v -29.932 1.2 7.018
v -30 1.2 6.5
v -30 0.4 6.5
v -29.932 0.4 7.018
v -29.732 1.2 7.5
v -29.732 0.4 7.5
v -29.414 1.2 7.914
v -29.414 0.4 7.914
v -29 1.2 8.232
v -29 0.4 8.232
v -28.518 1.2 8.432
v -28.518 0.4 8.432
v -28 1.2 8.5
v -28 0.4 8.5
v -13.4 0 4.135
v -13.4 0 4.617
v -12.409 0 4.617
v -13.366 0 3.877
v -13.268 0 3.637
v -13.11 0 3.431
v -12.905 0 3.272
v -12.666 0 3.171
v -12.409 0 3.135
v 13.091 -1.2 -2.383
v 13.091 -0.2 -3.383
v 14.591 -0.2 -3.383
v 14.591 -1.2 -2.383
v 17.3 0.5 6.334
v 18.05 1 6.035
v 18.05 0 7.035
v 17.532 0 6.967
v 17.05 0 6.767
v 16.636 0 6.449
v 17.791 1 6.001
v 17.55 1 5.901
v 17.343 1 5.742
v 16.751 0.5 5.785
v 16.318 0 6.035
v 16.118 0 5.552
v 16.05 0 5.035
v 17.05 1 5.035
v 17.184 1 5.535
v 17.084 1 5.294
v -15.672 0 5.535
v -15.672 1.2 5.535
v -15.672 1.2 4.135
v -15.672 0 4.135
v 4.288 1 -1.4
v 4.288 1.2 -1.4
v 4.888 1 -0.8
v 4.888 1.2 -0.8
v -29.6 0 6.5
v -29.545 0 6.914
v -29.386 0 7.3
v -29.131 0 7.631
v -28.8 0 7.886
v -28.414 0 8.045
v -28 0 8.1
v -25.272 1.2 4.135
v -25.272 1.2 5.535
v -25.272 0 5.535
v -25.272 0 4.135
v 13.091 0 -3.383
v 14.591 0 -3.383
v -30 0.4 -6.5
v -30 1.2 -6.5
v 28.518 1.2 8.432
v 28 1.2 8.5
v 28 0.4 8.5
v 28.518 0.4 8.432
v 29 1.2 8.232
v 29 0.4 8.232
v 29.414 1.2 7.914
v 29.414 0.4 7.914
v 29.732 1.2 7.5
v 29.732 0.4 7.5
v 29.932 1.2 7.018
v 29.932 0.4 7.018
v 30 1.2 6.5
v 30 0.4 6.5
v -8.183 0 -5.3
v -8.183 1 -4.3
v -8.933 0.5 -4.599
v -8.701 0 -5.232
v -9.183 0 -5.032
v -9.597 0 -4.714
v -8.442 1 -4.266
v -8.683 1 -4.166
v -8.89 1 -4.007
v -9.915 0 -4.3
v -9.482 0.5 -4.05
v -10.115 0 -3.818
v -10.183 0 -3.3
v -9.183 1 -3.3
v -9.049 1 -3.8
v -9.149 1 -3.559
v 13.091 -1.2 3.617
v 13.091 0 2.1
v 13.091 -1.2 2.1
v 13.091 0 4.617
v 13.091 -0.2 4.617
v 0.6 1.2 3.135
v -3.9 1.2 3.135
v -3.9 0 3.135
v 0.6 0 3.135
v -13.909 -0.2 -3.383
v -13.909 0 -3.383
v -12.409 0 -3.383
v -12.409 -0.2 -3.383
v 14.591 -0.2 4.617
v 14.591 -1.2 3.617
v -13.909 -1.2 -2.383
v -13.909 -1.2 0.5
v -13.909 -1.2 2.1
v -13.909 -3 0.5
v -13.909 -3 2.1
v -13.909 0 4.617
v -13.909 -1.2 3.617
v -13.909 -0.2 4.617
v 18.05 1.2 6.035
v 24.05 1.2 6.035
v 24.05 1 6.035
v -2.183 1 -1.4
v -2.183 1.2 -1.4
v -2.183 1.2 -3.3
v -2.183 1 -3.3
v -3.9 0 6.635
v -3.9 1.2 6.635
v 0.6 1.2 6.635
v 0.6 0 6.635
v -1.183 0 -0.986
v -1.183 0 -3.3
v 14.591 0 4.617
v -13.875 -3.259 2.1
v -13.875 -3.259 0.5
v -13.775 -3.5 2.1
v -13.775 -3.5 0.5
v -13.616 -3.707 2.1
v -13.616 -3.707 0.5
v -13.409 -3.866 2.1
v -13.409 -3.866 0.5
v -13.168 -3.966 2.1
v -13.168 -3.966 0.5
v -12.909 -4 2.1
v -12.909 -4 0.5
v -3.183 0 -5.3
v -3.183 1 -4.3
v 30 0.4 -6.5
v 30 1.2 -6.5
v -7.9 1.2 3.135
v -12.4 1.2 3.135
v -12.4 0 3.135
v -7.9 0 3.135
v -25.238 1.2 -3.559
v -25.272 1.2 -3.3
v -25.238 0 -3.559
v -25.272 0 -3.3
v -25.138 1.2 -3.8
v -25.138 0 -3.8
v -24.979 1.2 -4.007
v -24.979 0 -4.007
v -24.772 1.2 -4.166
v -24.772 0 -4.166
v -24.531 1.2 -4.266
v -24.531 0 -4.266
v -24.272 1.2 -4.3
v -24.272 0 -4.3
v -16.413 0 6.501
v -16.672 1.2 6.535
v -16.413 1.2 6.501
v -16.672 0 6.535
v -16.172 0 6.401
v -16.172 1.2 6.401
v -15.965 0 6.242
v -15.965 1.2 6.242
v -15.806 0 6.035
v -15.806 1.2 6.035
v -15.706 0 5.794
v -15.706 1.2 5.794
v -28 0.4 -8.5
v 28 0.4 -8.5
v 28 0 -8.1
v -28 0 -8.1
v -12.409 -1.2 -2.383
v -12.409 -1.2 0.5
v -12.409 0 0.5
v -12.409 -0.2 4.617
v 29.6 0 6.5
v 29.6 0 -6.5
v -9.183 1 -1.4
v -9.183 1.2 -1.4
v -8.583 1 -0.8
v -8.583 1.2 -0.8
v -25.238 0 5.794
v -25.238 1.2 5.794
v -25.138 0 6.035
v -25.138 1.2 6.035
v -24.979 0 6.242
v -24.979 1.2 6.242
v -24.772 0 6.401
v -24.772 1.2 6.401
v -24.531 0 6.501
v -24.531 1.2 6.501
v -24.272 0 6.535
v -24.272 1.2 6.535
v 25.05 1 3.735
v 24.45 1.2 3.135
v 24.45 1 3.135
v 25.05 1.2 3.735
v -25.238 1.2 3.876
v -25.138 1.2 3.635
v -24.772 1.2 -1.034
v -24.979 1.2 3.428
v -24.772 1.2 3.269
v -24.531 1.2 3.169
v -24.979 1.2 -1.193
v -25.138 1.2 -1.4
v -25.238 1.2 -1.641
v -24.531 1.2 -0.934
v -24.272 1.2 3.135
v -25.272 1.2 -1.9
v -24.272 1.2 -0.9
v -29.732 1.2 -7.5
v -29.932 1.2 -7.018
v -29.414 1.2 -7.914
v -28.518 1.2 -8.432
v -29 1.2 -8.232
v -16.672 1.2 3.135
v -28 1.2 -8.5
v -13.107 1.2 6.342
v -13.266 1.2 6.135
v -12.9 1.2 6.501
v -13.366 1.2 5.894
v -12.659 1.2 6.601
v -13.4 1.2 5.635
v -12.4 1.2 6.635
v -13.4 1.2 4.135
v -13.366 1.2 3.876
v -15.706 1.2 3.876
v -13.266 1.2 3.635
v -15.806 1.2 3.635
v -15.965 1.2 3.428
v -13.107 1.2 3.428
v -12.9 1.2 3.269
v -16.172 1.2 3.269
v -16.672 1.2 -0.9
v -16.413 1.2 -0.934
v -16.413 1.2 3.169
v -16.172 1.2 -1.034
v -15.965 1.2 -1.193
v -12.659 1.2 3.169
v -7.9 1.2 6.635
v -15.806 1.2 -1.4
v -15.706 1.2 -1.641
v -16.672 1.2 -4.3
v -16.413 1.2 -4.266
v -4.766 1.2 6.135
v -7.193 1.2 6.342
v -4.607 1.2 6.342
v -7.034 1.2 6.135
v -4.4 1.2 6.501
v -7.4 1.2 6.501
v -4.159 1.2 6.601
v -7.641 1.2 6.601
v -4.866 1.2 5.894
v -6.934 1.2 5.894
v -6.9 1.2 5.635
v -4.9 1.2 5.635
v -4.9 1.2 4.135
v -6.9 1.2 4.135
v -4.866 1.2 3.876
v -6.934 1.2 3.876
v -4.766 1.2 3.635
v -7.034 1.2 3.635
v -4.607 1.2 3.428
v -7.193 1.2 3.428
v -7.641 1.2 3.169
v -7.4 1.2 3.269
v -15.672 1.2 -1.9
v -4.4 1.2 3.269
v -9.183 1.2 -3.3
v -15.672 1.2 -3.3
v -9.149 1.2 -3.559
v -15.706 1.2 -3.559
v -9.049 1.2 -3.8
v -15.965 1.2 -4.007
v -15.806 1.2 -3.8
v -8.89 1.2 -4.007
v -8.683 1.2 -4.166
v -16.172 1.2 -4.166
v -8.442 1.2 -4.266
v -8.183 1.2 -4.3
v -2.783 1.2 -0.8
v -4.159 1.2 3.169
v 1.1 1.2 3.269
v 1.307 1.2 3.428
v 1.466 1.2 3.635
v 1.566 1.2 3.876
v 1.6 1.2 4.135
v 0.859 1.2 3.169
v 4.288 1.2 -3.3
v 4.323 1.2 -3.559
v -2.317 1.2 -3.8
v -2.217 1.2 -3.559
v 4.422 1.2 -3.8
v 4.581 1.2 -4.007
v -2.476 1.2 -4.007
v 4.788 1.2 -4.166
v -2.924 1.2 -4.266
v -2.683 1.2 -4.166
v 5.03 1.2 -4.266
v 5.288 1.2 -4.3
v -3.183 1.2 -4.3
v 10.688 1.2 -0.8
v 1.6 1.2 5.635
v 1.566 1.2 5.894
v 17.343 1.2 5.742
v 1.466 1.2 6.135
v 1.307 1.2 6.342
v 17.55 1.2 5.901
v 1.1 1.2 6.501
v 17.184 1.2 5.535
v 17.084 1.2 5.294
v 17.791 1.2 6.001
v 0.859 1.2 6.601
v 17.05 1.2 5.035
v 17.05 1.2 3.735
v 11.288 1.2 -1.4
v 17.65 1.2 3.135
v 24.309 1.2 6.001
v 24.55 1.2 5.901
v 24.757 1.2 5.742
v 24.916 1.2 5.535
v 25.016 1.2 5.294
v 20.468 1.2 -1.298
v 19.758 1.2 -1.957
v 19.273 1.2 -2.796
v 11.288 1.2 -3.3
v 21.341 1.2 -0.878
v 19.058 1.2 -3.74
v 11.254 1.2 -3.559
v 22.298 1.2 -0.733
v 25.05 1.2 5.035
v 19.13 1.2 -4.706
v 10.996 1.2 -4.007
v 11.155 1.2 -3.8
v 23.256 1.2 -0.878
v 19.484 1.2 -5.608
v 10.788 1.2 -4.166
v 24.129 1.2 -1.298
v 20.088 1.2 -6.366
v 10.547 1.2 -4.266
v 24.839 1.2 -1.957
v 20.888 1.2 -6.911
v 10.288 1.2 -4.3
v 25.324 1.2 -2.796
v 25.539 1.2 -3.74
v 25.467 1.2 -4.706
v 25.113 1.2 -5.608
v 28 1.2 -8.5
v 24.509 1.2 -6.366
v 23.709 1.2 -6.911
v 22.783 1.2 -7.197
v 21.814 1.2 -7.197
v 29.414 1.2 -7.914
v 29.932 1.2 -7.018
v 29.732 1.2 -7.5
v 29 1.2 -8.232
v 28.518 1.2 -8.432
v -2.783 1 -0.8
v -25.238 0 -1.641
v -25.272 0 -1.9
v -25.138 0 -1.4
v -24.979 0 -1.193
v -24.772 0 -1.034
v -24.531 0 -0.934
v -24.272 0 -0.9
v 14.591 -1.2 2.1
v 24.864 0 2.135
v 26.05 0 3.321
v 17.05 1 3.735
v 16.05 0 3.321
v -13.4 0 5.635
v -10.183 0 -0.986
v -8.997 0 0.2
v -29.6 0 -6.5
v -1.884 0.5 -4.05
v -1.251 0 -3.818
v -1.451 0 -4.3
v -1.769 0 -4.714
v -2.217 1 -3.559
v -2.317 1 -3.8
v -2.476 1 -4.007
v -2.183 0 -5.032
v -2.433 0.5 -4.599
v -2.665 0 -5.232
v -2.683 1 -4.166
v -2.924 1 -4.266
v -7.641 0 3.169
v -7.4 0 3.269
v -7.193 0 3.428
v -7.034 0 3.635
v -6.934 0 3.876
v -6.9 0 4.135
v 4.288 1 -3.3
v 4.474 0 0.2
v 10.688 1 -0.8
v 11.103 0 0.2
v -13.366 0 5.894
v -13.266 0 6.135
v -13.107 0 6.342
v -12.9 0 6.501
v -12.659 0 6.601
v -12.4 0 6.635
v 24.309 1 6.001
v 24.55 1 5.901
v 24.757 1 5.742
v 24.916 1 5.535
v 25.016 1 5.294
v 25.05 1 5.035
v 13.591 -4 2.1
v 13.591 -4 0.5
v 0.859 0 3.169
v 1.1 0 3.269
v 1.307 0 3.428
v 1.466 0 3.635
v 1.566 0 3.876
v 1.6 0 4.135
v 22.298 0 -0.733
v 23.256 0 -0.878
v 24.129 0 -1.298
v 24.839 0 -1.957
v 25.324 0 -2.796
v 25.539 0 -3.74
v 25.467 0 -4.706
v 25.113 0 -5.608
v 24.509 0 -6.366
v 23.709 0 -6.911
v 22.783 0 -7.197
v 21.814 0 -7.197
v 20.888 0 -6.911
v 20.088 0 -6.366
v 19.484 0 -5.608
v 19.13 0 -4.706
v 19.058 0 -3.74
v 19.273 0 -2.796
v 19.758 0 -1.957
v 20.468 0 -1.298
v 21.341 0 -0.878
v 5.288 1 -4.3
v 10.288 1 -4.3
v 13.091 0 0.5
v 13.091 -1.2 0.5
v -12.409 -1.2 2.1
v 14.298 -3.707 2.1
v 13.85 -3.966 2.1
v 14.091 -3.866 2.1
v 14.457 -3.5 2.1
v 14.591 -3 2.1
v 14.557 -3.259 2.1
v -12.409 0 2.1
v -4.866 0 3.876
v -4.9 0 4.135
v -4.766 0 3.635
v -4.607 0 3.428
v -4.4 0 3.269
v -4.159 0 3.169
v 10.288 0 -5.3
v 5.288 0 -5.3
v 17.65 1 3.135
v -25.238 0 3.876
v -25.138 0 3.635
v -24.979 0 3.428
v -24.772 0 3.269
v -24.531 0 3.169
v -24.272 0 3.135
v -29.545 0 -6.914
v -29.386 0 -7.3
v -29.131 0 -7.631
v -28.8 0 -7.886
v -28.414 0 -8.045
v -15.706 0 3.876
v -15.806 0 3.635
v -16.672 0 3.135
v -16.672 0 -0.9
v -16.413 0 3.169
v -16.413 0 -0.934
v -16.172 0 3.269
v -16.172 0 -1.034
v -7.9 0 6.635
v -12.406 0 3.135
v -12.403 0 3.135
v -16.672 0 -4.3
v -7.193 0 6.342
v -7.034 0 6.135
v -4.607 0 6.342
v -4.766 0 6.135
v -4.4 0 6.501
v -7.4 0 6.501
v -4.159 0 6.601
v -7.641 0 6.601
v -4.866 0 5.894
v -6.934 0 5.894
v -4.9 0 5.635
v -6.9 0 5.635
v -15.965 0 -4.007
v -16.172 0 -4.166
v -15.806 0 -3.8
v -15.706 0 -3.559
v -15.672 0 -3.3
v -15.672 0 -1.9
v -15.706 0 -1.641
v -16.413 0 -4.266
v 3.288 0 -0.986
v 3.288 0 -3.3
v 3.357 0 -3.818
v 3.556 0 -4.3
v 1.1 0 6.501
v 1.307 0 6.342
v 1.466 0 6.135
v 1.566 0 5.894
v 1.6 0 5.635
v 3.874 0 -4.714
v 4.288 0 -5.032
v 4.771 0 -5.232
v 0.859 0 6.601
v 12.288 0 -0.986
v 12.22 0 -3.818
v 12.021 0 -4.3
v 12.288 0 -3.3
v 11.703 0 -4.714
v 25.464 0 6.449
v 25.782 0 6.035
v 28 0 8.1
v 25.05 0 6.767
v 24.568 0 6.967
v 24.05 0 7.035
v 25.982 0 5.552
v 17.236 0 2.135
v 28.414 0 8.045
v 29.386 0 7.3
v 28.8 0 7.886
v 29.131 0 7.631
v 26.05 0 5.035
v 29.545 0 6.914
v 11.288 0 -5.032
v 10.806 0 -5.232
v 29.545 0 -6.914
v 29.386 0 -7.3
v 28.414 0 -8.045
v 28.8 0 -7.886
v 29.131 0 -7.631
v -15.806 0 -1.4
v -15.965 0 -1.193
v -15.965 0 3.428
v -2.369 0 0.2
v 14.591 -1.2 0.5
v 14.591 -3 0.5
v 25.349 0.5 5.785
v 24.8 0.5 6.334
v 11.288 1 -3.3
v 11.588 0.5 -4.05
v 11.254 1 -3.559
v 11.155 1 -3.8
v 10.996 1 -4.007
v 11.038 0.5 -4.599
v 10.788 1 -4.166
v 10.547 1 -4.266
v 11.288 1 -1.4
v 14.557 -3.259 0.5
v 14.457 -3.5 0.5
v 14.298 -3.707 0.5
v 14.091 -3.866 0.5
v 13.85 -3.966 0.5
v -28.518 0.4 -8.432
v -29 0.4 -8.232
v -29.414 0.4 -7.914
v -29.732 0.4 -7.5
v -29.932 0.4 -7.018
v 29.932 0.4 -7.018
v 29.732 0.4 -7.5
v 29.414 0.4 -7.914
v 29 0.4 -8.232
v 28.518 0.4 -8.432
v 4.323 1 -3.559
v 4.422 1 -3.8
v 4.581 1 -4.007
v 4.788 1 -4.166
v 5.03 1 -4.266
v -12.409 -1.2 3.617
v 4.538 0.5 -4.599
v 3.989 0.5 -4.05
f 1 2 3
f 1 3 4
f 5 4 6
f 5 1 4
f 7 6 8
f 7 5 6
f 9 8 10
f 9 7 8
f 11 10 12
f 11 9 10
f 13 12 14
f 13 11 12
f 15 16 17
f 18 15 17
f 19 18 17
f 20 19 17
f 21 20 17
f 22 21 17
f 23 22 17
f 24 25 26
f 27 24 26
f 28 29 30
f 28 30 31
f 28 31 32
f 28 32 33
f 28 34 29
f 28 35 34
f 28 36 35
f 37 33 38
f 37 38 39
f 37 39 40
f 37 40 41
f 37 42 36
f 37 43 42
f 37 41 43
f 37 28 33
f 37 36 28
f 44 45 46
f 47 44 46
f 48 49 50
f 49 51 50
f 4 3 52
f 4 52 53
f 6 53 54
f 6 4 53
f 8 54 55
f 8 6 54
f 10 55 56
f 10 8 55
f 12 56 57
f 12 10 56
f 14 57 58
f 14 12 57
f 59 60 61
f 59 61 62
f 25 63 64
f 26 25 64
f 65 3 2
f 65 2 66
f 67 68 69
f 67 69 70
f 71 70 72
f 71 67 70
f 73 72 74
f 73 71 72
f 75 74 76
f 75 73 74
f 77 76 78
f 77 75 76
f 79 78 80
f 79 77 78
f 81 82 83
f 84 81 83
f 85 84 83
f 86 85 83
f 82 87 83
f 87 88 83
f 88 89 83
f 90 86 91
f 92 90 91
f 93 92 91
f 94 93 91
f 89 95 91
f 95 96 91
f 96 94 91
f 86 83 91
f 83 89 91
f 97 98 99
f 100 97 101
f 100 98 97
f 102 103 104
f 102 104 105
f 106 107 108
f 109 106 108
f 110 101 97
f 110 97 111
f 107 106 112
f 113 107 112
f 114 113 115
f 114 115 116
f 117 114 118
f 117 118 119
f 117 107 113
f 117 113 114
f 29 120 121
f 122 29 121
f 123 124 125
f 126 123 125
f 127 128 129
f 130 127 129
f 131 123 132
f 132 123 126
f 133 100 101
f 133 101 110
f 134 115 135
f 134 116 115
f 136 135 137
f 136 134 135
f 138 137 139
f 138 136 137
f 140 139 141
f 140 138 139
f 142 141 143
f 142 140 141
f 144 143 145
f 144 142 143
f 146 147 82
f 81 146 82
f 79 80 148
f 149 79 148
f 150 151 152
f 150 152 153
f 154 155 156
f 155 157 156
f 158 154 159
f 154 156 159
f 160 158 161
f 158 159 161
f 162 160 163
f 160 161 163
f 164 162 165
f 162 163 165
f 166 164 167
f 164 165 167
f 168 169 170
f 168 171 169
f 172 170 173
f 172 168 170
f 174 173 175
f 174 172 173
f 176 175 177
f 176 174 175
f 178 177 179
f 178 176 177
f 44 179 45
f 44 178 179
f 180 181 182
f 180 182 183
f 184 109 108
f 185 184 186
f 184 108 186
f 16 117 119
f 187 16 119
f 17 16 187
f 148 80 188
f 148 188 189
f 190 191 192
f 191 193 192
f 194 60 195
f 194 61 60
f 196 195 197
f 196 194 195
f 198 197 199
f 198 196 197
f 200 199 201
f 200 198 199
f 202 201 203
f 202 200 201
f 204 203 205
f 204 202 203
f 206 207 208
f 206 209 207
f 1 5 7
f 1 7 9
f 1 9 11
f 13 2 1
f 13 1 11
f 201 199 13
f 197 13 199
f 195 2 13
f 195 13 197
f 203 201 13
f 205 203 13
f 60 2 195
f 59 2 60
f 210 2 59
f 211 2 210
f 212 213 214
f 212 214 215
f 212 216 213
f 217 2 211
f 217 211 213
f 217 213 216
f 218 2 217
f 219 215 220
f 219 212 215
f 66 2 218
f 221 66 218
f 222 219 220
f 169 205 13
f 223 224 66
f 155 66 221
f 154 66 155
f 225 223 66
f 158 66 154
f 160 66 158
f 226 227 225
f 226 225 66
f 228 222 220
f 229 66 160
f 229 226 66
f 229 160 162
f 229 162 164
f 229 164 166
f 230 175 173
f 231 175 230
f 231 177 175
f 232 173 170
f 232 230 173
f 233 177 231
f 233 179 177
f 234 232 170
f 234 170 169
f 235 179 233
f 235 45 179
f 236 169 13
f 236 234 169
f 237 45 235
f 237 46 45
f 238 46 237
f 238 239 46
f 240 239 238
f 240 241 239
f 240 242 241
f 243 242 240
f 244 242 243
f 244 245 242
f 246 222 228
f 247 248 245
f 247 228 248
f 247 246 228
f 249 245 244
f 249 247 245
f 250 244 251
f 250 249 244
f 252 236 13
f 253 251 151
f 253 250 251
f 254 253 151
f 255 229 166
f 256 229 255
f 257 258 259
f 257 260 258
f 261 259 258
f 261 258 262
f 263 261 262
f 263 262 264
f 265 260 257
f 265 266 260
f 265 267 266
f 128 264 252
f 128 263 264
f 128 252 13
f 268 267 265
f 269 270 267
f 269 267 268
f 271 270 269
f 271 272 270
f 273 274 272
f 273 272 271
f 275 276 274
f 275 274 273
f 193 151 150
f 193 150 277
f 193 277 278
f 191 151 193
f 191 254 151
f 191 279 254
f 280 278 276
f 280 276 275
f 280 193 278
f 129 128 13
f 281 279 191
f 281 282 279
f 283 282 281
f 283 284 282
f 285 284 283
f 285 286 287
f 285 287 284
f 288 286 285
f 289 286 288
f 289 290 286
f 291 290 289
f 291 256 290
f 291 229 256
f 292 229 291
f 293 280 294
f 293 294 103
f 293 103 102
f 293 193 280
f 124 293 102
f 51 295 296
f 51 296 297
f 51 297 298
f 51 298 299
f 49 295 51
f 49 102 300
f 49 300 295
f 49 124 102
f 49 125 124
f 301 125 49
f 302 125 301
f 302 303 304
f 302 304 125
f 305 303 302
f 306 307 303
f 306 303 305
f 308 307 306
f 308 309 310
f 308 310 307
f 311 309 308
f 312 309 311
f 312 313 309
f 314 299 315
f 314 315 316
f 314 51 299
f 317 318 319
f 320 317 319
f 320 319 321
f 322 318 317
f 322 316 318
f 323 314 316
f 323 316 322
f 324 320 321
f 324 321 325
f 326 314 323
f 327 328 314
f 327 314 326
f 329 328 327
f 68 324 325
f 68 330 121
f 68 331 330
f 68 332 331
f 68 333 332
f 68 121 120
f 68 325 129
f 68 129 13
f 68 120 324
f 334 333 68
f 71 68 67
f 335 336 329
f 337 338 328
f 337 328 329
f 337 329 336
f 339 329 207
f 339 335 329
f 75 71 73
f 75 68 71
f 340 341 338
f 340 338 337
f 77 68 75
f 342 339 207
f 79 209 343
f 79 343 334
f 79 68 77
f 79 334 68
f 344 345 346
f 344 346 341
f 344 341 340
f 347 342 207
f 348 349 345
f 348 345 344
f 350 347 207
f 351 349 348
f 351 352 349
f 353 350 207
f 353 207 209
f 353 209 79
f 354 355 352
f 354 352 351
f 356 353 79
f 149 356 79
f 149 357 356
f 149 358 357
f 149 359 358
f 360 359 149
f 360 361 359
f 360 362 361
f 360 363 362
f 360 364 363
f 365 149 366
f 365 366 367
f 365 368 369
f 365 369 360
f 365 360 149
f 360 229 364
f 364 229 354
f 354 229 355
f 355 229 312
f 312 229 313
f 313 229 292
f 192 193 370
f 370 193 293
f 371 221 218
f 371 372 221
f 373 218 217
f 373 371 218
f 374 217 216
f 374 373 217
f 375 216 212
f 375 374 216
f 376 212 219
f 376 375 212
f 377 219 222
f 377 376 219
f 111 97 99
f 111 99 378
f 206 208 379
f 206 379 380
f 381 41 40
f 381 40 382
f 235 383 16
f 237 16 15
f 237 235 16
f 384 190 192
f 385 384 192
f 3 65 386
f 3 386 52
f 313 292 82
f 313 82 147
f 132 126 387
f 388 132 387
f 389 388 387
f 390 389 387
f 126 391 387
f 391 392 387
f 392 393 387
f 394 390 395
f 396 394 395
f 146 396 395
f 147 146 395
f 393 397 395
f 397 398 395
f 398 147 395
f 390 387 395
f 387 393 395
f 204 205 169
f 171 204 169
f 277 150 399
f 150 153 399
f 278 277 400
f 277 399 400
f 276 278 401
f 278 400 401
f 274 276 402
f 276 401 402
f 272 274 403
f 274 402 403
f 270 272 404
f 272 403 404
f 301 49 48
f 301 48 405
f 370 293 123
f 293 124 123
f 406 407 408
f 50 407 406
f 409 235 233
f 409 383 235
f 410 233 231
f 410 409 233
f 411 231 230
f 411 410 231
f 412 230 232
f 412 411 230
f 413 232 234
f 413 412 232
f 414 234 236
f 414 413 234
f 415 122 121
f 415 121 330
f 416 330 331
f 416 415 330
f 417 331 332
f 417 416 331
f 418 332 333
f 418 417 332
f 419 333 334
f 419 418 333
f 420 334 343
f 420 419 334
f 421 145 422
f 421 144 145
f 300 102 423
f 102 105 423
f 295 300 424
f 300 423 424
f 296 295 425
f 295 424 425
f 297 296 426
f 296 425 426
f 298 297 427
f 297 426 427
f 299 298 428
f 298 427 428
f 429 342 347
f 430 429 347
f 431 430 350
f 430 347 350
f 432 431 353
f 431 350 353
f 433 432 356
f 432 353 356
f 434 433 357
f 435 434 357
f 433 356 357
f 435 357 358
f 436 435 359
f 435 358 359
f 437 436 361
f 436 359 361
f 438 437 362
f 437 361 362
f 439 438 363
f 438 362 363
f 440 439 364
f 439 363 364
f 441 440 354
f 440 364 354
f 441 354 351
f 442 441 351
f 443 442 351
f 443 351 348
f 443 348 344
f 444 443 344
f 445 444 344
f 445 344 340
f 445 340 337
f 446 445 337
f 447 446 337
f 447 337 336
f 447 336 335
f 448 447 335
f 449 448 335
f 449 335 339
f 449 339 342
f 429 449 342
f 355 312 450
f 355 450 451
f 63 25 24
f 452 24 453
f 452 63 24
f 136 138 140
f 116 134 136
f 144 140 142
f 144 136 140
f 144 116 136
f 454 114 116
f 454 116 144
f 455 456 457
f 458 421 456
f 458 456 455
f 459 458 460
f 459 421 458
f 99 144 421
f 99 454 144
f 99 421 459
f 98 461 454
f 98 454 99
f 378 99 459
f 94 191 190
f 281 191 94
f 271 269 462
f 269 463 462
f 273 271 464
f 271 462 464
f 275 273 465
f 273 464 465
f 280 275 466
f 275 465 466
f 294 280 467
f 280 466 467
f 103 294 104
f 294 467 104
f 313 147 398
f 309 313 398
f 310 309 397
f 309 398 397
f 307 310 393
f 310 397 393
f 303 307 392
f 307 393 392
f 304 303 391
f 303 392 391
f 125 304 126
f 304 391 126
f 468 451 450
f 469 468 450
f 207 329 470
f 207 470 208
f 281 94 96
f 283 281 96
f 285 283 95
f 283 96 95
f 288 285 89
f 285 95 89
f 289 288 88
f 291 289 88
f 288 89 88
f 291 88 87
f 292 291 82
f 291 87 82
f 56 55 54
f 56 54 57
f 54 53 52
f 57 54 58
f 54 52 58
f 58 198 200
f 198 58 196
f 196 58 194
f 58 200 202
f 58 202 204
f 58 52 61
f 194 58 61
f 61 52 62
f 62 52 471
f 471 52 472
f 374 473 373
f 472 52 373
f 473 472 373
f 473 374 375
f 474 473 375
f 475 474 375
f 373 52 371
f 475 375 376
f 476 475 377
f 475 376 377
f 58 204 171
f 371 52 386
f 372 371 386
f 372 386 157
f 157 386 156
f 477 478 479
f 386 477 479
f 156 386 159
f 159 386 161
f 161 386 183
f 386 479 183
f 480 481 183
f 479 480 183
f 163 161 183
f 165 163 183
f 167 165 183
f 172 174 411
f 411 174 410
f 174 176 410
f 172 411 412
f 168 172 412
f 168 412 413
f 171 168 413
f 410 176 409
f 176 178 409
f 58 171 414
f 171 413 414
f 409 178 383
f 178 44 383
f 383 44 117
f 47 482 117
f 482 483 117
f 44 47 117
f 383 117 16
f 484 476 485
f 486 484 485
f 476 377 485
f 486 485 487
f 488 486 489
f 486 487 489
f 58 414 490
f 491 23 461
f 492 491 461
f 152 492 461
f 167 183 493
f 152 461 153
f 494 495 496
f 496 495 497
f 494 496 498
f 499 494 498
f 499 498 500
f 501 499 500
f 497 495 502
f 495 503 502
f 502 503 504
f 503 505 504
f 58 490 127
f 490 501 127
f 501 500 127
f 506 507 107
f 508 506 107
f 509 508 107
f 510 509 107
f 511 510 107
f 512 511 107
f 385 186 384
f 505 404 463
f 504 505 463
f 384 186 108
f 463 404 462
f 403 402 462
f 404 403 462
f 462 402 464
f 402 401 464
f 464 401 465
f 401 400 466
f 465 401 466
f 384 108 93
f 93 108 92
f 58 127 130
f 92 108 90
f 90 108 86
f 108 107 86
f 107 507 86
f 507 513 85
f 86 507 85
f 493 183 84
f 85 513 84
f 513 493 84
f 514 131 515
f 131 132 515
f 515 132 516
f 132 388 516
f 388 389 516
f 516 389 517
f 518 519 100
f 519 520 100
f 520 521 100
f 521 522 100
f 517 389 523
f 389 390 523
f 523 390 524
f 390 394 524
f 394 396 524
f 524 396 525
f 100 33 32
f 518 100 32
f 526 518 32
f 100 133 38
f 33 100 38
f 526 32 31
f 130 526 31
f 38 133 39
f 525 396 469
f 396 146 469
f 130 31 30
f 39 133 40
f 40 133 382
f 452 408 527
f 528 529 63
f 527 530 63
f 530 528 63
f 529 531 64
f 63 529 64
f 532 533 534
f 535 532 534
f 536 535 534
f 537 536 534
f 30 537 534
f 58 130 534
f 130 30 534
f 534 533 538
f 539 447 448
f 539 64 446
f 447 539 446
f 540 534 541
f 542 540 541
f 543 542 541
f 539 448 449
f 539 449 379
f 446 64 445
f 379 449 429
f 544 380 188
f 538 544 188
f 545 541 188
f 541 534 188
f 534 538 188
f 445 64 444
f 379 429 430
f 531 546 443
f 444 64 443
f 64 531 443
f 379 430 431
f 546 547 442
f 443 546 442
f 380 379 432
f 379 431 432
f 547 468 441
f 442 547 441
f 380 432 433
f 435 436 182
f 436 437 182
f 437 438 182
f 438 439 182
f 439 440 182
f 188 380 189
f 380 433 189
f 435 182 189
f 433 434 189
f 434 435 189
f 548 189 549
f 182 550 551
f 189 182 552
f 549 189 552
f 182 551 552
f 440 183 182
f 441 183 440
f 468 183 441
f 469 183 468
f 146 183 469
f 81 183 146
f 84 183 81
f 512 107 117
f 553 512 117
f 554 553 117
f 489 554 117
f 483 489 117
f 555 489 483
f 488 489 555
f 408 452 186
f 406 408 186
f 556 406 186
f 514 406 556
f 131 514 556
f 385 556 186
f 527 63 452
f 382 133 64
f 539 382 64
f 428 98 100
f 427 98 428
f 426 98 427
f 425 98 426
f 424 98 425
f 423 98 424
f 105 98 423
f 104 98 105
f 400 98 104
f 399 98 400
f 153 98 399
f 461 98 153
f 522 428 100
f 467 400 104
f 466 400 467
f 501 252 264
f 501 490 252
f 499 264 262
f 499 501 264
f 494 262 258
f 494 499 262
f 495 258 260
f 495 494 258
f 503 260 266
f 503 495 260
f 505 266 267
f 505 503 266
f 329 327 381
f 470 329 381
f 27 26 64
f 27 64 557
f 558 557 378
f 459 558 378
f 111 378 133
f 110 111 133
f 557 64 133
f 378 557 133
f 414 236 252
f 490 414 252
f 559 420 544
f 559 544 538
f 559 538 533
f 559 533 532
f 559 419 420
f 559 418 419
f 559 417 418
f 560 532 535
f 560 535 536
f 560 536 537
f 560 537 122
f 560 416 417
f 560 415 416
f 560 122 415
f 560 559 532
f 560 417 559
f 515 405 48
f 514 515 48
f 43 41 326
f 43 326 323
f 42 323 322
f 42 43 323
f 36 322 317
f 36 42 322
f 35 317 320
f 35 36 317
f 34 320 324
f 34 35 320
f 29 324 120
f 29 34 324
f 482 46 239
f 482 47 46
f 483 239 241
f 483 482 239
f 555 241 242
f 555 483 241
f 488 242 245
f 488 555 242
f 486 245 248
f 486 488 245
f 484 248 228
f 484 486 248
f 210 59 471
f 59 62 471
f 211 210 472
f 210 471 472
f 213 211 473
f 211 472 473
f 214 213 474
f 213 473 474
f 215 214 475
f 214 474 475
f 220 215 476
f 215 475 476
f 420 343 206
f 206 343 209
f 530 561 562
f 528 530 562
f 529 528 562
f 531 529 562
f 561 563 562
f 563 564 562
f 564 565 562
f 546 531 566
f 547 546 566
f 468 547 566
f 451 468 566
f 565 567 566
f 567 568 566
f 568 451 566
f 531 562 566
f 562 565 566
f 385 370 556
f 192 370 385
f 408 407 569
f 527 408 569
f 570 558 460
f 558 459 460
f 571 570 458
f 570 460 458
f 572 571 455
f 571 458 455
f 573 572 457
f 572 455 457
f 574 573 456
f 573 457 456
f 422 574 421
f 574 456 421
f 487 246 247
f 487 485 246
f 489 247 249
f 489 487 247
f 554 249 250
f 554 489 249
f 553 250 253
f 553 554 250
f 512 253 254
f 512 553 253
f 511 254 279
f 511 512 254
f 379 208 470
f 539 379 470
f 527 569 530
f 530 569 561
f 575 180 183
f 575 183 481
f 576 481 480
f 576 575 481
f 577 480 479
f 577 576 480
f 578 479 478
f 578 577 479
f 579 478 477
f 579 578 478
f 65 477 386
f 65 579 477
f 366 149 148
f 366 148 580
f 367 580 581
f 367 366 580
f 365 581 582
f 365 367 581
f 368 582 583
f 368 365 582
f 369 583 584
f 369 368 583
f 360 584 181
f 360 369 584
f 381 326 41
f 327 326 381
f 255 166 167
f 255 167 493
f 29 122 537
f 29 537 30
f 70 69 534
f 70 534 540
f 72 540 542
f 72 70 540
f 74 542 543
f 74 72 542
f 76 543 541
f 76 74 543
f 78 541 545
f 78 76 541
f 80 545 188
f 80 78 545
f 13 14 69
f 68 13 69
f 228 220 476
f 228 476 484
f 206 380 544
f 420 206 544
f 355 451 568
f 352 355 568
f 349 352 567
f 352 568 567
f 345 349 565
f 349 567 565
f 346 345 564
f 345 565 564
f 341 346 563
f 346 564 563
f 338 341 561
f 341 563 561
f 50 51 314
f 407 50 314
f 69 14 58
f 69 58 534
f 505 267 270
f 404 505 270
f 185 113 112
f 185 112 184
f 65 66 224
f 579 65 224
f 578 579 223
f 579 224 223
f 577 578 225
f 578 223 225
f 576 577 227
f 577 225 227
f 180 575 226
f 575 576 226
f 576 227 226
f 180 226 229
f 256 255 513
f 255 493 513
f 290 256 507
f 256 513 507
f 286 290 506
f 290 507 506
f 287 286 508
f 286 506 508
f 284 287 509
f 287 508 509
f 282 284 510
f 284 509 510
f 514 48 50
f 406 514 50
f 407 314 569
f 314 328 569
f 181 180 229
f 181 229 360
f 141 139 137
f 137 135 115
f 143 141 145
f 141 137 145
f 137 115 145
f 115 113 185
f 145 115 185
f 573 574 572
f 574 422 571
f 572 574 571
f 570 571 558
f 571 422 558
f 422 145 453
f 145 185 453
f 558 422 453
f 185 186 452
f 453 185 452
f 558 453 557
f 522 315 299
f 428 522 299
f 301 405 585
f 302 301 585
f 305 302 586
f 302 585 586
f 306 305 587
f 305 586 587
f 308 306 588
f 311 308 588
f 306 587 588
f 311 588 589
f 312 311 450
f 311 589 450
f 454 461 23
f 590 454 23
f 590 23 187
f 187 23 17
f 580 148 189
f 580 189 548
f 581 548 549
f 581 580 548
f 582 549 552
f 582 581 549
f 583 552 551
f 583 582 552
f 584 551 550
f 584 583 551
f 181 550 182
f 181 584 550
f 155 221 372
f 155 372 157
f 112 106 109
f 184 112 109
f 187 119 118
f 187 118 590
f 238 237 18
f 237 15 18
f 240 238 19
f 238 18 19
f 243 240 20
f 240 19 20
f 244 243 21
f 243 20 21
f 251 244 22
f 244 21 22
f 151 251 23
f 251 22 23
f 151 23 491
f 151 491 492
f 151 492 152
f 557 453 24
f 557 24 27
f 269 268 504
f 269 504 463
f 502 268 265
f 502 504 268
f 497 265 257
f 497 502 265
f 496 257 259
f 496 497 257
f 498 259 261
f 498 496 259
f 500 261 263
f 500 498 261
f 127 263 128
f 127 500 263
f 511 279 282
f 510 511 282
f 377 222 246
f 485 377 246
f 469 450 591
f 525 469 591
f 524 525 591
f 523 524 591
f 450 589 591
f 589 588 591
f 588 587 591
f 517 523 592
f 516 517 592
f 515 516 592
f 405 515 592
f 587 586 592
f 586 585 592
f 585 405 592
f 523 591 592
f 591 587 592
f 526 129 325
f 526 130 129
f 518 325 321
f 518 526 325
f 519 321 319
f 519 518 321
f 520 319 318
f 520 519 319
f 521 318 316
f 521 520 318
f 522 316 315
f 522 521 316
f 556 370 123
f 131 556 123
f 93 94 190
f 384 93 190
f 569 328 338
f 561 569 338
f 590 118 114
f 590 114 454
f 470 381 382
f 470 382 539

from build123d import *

# Parameters (mm, degrees)
SKETCH_1_W          = 60
SKETCH_1_H          = 17
EXTRUDE_1_DEPTH     = 1.2
CUT_EXTRUDE_1_REACH = 33.204
SKETCH_4_R          = 3.25
SKETCH_4_W          = 9.6
SKETCH_4_H          = 3.4
SKETCH_4_W_2        = 7
SKETCH_4_H_2        = 3.5
SKETCH_4_W_3        = 8
SKETCH_4_H_3        = 2.9
SKETCH_4_W_4        = 6.5
FILLET_2_R          = 1
CHAMFER_1_SIZE      = 0.6
SKETCH_5_W          = 1.5
SKETCH_5_H          = 8
EXTRUDE_2_DEPTH     = 1.2
SKETCH_6_W          = 28.5
SKETCH_6_H          = 1.6
EXTRUDE_3_DEPTH     = 4
FILLET_3_R          = 1
CHAMFER_2_SIZE      = 1
CHAMFER_4_SIZE      = 1
FILLET_4_R          = 2
CHAMFER_5_SIZE      = 0.4


with BuildPart() as part:
    # 草图1 → 凸台-拉伸1 (new body)
    with BuildSketch(Plane(origin=(0, 0, 0), x_dir=(1, 0, 0), z_dir=(0, 1, 0))):
        Rectangle(SKETCH_1_W, SKETCH_1_H)
    extrude(amount=EXTRUDE_1_DEPTH)

    # 草图4 → 切除-拉伸1 (cut, up to next)
    with BuildSketch(Plane(origin=(0, 1.2, 0), x_dir=(1, 0, 0), z_dir=(0, 1, 0)), mode=Mode.PRIVATE) as cut_extrude_1_sk1:
        with Locations(Location((22.298485985, 3.98318929, 0), (0, 0, 270))):
            Circle(SKETCH_4_R)
    cut_extrude_1_tool1 = extrude(cut_extrude_1_sk1.sketch, amount=-CUT_EXTRUDE_1_REACH, mode=Mode.PRIVATE) & part.part
    # 草图4 → 切除-拉伸1 (cut, up to next)
    with BuildSketch(Plane(origin=(0, 1.2, 0), x_dir=(1, 0, 0), z_dir=(0, 1, 0)), mode=Mode.PRIVATE) as cut_extrude_1_sk2:
        with Locations((-20.471722325, 2.6)):
            Rectangle(SKETCH_4_W, SKETCH_4_H)
    cut_extrude_1_tool2 = extrude(cut_extrude_1_sk2.sketch, amount=-CUT_EXTRUDE_1_REACH, mode=Mode.PRIVATE) & part.part
    # 草图4 → 切除-拉伸1 (cut, up to next)
    with BuildSketch(Plane(origin=(0, 1.2, 0), x_dir=(1, 0, 0), z_dir=(0, 1, 0)), mode=Mode.PRIVATE) as cut_extrude_1_sk3:
        with Locations((-5.682926277, 2.55)):
            Rectangle(SKETCH_4_W_2, SKETCH_4_H_2)
    cut_extrude_1_tool3 = extrude(cut_extrude_1_sk3.sketch, amount=-CUT_EXTRUDE_1_REACH, mode=Mode.PRIVATE) & part.part
    # 草图4 → 切除-拉伸1 (cut, up to next)
    with BuildSketch(Plane(origin=(0, 1.2, 0), x_dir=(1, 0, 0), z_dir=(0, 1, 0)), mode=Mode.PRIVATE) as cut_extrude_1_sk4:
        with Locations((7.788485985, 2.55)):
            Rectangle(SKETCH_4_W_2, SKETCH_4_H_2)
    cut_extrude_1_tool4 = extrude(cut_extrude_1_sk4.sketch, amount=-CUT_EXTRUDE_1_REACH, mode=Mode.PRIVATE) & part.part
    # 草图4 → 切除-拉伸1 (cut, up to next)
    with BuildSketch(Plane(origin=(0, 1.2, 0), x_dir=(1, 0, 0), z_dir=(0, 1, 0)), mode=Mode.PRIVATE) as cut_extrude_1_sk5:
        with Locations((21.05, -4.584803861)):
            Rectangle(SKETCH_4_W_3, SKETCH_4_H_3)
    cut_extrude_1_tool5 = extrude(cut_extrude_1_sk5.sketch, amount=-CUT_EXTRUDE_1_REACH, mode=Mode.PRIVATE) & part.part
    # 草图4 → 切除-拉伸1 (cut, up to next)
    with BuildSketch(Plane(origin=(0, 1.2, 0), x_dir=(1, 0, 0), z_dir=(0, 1, 0)), mode=Mode.PRIVATE) as cut_extrude_1_sk6:
        with Locations((-1.65, -4.884803861)):
            Rectangle(SKETCH_4_W_4, SKETCH_4_H_2)
    cut_extrude_1_tool6 = extrude(cut_extrude_1_sk6.sketch, amount=-CUT_EXTRUDE_1_REACH, mode=Mode.PRIVATE) & part.part
    # 草图4 → 切除-拉伸1 (cut, up to next)
    with BuildSketch(Plane(origin=(0, 1.2, 0), x_dir=(1, 0, 0), z_dir=(0, 1, 0)), mode=Mode.PRIVATE) as cut_extrude_1_sk7:
        with Locations((-10.15, -4.884803861)):
            Rectangle(SKETCH_4_W_4, SKETCH_4_H_2)
    cut_extrude_1_tool7 = extrude(cut_extrude_1_sk7.sketch, amount=-CUT_EXTRUDE_1_REACH, mode=Mode.PRIVATE) & part.part
    # 草图4 → 切除-拉伸1 (cut, up to next)
    with BuildSketch(Plane(origin=(0, 1.2, 0), x_dir=(1, 0, 0), z_dir=(0, 1, 0)), mode=Mode.PRIVATE) as cut_extrude_1_sk8:
        with Locations((-20.471722325, -4.834803861)):
            Rectangle(SKETCH_4_W, SKETCH_4_H)
    cut_extrude_1_tool8 = extrude(cut_extrude_1_sk8.sketch, amount=-CUT_EXTRUDE_1_REACH, mode=Mode.PRIVATE) & part.part
    add(cut_extrude_1_tool1.solids().sort_by_distance((22.298486, 1.2, -3.983189))[0], mode=Mode.SUBTRACT)
    add(cut_extrude_1_tool2.solids().sort_by_distance((-20.471722, 1.2, -2.6))[0], mode=Mode.SUBTRACT)
    add(cut_extrude_1_tool3.solids().sort_by_distance((-5.682926, 1.2, -2.55))[0], mode=Mode.SUBTRACT)
    add(cut_extrude_1_tool4.solids().sort_by_distance((7.788486, 1.2, -2.55))[0], mode=Mode.SUBTRACT)
    add(cut_extrude_1_tool5.solids().sort_by_distance((21.05, 1.2, 4.584804))[0], mode=Mode.SUBTRACT)
    add(cut_extrude_1_tool6.solids().sort_by_distance((-1.65, 1.2, 4.884804))[0], mode=Mode.SUBTRACT)
    add(cut_extrude_1_tool7.solids().sort_by_distance((-10.15, 1.2, 4.884804))[0], mode=Mode.SUBTRACT)
    add(cut_extrude_1_tool8.solids().sort_by_distance((-20.471722, 1.2, 4.834804))[0], mode=Mode.SUBTRACT)

    # 圆角2
    fillet_2_edges = [part.edges().sort_by_distance(p)[0] for p in [
        (-9.182926277, 0.6, -4.3),
        (-2.182926277, 0.6, -4.3),
        (4.288485985, 0.6, -4.3),
        (11.288485985, 0.6, -4.3),
        (17.05, 0.6, 6.034803861),
        (25.05, 0.6, 6.034803861),
        (-4.9, 0.6, 6.634803861),
        (-4.9, 0.6, 3.134803861),
        (1.6, 0.6, 3.134803861),
        (1.6, 0.6, 6.634803861),
        (-13.4, 0.6, 6.634803861),
        (-13.4, 0.6, 3.134803861),
        (-6.9, 0.6, 3.134803861),
        (-6.9, 0.6, 6.634803861),
        (-25.271722325, 0.6, 6.534803861),
        (-25.271722325, 0.6, 3.134803861),
        (-15.671722325, 0.6, 3.134803861),
        (-15.671722325, 0.6, 6.534803861),
        (-25.271722325, 0.6, -0.9),
        (-25.271722325, 0.6, -4.3),
        (-15.671722325, 0.6, -4.3),
        (-15.671722325, 0.6, -0.9),
    ]]
    fillet(fillet_2_edges, radius=FILLET_2_R)

    # 倒角1
    chamfer_1_edges = [part.edges().sort_by_distance(p)[0] for p in [
        (-9.182926277, 0.6, -0.8),
        (-2.182926277, 0.6, -0.8),
        (4.288485985, 0.6, -0.8),
        (11.288485985, 0.6, -0.8),
        (17.05, 0.6, 3.134803861),
        (25.05, 0.6, 3.134803861),
    ]]
    chamfer(chamfer_1_edges, length=CHAMFER_1_SIZE)

    # 草图5 → 凸台-拉伸2 (add)
    with BuildSketch(Plane.XZ):
        with Locations((-13.15891381, 0.61681071)):
            Rectangle(SKETCH_5_W, SKETCH_5_H)
        with Locations((13.84108619, 0.61681071)):
            Rectangle(SKETCH_5_W, SKETCH_5_H)
    extrude(amount=EXTRUDE_2_DEPTH)

    # 草图6 → 凸台-拉伸3 (add)
    with BuildSketch(Plane.XZ):
        with Locations((0.34108619, 1.3)):
            Rectangle(SKETCH_6_W, SKETCH_6_H)
    extrude(amount=EXTRUDE_3_DEPTH)

    # 圆角3
    fillet_3_edges = [part.edges().sort_by_distance(p)[0] for p in [
        (-13.90891381, -4, 1.3),
        (14.59108619, -4, 1.3),
    ]]
    fillet(fillet_3_edges, radius=FILLET_3_R)

    # 倒角2
    chamfer_2_edges = [part.edges().sort_by_distance(p)[0] for p in [
        (-13.15891381, -1.2, -3.38318929),
        (-13.15891381, -1.2, 4.61681071),
        (13.84108619, -1.2, -3.38318929),
        (13.84108619, -1.2, 4.61681071),
    ]]
    chamfer(chamfer_2_edges, length=CHAMFER_2_SIZE)

    # 倒角4
    chamfer_4_edges = [part.edges().sort_by_distance(p)[0] for p in [
        (-5.682926277, 0, -4.3),
        (-2.182926277, 0, -2.35),
        (7.788485985, 0, -4.3),
        (11.288485985, 0, -2.35),
        (21.05, 0, 6.034803861),
        (17.05, 0, 4.384803861),
        (-2.475819496, 0, -4.007106781),
        (-8.890033058, 0, -4.007106781),
        (4.581379204, 0, -4.007106781),
        (10.995592766, 0, -4.007106781),
        (24.757106781, 0, 5.741910642),
        (17.342893219, 0, 5.741910642),
        (-5.682926277, 0, -0.8),
        (-9.182926277, 0, -2.35),
        (7.788485985, 0, -0.8),
        (4.288485985, 0, -2.35),
        (21.05, 0, 3.134803861),
        (25.05, 0, 4.384803861),
        (-8.882926277, 0, -1.1),
        (-2.482926277, 0, -1.1),
        (4.588485985, 0, -1.1),
        (10.988485985, 0, -1.1),
        (17.35, 0, 3.434803861),
        (24.75, 0, 3.434803861),
    ]]
    chamfer(chamfer_4_edges, length=CHAMFER_4_SIZE)

    # 圆角4
    fillet_4_edges = [part.edges().sort_by_distance(p)[0] for p in [
        (30, 0.6, 8.5),
        (-30, 0.6, 8.5),
        (-30, 0.6, -8.5),
        (30, 0.6, -8.5),
    ]]
    fillet(fillet_4_edges, radius=FILLET_4_R)

    # 倒角5
    chamfer_5_edges = [part.edges().sort_by_distance(p)[0] for p in [
        (30, 0, 0),
        (0, 0, 8.5),
        (-30, 0, 0),
        (0, 0, -8.5),
        (-29.414213562, 0, -7.914213562),
        (-29.414213562, 0, 7.914213562),
        (29.414213562, 0, -7.914213562),
        (29.414213562, 0, 7.914213562),
    ]]
    chamfer(chamfer_5_edges, length=CHAMFER_5_SIZE)


solid = part.part
